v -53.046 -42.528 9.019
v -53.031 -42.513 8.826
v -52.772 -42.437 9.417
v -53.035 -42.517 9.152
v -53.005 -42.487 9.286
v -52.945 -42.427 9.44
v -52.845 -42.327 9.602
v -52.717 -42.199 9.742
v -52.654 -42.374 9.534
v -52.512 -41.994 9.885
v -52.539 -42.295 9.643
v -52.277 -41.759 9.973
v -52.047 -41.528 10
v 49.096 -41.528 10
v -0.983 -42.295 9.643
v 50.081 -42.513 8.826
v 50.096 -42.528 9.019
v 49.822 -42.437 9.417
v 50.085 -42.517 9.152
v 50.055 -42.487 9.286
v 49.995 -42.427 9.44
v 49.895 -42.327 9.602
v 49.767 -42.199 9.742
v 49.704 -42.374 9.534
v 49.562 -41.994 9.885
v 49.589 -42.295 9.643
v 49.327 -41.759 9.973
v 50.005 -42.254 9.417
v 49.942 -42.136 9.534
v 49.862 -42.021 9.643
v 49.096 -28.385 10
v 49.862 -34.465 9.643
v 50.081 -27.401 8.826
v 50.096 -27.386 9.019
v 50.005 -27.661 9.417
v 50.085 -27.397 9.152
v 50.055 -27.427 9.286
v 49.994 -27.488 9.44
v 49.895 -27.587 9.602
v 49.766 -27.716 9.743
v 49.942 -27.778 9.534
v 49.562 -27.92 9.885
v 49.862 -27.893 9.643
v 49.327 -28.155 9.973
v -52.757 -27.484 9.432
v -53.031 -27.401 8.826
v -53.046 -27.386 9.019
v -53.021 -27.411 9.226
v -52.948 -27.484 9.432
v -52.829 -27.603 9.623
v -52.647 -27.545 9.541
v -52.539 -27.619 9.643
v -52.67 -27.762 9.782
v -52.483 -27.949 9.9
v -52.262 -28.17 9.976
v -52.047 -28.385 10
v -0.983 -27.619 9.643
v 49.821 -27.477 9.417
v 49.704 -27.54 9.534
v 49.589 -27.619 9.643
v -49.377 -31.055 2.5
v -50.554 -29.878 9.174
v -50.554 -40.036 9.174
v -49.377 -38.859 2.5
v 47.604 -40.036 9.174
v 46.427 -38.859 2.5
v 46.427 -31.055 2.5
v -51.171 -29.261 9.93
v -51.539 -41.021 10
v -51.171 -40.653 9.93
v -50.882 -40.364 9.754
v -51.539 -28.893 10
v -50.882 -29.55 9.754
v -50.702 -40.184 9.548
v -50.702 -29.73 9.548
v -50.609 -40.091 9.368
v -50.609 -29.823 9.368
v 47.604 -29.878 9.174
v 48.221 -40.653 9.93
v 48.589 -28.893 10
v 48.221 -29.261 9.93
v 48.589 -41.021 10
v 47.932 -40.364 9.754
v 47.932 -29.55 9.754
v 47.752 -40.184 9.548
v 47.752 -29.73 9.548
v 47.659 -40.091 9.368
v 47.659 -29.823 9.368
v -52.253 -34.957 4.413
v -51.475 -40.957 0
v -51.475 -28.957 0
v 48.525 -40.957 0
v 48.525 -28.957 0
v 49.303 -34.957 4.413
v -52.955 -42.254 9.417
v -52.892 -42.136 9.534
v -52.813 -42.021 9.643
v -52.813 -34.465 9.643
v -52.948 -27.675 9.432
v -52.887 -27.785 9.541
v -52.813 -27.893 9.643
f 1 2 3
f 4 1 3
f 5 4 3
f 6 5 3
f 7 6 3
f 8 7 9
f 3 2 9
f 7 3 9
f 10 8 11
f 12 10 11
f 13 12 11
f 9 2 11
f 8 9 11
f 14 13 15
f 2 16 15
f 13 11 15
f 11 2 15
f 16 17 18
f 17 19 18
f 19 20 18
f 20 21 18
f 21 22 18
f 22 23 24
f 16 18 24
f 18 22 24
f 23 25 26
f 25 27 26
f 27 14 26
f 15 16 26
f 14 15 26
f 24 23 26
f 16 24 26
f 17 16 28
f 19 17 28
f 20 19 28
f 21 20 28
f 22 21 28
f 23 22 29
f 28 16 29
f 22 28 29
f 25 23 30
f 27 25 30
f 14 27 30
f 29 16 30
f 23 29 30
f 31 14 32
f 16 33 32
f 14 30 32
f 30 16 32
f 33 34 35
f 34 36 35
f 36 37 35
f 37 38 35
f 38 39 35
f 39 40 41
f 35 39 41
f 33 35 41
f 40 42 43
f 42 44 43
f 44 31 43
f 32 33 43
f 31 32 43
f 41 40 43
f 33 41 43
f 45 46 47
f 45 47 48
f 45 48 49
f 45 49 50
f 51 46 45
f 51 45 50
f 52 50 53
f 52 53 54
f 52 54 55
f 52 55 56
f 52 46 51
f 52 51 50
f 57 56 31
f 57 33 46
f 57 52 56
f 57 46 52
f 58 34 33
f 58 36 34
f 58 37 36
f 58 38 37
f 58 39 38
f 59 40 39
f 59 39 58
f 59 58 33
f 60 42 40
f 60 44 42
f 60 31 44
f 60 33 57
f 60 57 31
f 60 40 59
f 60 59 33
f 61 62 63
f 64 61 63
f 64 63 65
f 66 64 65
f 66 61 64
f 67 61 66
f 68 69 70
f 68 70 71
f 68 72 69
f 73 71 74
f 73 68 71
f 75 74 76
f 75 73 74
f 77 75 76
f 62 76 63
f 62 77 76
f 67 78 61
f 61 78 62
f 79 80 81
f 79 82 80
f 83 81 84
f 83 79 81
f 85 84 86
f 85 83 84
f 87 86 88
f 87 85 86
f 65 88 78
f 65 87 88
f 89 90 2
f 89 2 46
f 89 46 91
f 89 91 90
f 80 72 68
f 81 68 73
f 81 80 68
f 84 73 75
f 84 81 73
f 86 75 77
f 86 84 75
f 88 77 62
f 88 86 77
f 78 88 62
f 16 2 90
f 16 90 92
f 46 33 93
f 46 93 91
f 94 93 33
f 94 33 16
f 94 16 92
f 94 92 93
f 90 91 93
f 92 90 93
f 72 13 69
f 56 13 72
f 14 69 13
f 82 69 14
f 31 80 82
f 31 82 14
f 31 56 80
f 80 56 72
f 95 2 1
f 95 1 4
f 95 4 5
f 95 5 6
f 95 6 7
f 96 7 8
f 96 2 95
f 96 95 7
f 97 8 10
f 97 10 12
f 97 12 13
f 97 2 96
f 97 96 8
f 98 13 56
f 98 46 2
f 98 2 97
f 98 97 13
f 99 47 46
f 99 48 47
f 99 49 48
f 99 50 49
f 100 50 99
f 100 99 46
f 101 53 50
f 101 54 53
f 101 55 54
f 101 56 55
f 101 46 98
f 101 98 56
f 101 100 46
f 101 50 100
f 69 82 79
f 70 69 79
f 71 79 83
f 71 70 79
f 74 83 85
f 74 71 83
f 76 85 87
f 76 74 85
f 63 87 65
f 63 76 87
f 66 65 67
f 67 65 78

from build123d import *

# Parameters (mm, degrees)
F0_W     = 100
F0_H     = 12
F1_DEPTH = 10
F1_TAPER = -10
F2_T     = -2.5
F3_R     = 1


with BuildPart() as f1:
    # F0 (on Top) → F1 (new body)
    with BuildSketch(Plane.XY):
        with Locations((-1.4750659466, -34.9569652333)):
            Rectangle(F0_W, F0_H)
    extrude(amount=F1_DEPTH, taper=F1_TAPER)

    # F2
    f2_openings = [f1.faces().sort_by_distance(p)[0] for p in [
        (-1.475066, -34.956965, 10),
    ]]
    offset(amount=F2_T, openings=f2_openings)

    # F3
    f3_edges = [f1.edges().sort_by_distance(p)[0] for p in [
        (-1.475066, -42.720235, 10),
        (-53.238336, -34.956965, 10),
        (-1.475066, -27.193695, 10),
        (50.288204, -34.956965, 10),
        (-1.475066, -29.732262, 10),
        (47.749637, -34.956965, 10),
        (-1.475066, -40.181669, 10),
        (-50.699769, -34.956965, 10),
    ]]
    fillet(f3_edges, radius=F3_R)


solid = f1.part
